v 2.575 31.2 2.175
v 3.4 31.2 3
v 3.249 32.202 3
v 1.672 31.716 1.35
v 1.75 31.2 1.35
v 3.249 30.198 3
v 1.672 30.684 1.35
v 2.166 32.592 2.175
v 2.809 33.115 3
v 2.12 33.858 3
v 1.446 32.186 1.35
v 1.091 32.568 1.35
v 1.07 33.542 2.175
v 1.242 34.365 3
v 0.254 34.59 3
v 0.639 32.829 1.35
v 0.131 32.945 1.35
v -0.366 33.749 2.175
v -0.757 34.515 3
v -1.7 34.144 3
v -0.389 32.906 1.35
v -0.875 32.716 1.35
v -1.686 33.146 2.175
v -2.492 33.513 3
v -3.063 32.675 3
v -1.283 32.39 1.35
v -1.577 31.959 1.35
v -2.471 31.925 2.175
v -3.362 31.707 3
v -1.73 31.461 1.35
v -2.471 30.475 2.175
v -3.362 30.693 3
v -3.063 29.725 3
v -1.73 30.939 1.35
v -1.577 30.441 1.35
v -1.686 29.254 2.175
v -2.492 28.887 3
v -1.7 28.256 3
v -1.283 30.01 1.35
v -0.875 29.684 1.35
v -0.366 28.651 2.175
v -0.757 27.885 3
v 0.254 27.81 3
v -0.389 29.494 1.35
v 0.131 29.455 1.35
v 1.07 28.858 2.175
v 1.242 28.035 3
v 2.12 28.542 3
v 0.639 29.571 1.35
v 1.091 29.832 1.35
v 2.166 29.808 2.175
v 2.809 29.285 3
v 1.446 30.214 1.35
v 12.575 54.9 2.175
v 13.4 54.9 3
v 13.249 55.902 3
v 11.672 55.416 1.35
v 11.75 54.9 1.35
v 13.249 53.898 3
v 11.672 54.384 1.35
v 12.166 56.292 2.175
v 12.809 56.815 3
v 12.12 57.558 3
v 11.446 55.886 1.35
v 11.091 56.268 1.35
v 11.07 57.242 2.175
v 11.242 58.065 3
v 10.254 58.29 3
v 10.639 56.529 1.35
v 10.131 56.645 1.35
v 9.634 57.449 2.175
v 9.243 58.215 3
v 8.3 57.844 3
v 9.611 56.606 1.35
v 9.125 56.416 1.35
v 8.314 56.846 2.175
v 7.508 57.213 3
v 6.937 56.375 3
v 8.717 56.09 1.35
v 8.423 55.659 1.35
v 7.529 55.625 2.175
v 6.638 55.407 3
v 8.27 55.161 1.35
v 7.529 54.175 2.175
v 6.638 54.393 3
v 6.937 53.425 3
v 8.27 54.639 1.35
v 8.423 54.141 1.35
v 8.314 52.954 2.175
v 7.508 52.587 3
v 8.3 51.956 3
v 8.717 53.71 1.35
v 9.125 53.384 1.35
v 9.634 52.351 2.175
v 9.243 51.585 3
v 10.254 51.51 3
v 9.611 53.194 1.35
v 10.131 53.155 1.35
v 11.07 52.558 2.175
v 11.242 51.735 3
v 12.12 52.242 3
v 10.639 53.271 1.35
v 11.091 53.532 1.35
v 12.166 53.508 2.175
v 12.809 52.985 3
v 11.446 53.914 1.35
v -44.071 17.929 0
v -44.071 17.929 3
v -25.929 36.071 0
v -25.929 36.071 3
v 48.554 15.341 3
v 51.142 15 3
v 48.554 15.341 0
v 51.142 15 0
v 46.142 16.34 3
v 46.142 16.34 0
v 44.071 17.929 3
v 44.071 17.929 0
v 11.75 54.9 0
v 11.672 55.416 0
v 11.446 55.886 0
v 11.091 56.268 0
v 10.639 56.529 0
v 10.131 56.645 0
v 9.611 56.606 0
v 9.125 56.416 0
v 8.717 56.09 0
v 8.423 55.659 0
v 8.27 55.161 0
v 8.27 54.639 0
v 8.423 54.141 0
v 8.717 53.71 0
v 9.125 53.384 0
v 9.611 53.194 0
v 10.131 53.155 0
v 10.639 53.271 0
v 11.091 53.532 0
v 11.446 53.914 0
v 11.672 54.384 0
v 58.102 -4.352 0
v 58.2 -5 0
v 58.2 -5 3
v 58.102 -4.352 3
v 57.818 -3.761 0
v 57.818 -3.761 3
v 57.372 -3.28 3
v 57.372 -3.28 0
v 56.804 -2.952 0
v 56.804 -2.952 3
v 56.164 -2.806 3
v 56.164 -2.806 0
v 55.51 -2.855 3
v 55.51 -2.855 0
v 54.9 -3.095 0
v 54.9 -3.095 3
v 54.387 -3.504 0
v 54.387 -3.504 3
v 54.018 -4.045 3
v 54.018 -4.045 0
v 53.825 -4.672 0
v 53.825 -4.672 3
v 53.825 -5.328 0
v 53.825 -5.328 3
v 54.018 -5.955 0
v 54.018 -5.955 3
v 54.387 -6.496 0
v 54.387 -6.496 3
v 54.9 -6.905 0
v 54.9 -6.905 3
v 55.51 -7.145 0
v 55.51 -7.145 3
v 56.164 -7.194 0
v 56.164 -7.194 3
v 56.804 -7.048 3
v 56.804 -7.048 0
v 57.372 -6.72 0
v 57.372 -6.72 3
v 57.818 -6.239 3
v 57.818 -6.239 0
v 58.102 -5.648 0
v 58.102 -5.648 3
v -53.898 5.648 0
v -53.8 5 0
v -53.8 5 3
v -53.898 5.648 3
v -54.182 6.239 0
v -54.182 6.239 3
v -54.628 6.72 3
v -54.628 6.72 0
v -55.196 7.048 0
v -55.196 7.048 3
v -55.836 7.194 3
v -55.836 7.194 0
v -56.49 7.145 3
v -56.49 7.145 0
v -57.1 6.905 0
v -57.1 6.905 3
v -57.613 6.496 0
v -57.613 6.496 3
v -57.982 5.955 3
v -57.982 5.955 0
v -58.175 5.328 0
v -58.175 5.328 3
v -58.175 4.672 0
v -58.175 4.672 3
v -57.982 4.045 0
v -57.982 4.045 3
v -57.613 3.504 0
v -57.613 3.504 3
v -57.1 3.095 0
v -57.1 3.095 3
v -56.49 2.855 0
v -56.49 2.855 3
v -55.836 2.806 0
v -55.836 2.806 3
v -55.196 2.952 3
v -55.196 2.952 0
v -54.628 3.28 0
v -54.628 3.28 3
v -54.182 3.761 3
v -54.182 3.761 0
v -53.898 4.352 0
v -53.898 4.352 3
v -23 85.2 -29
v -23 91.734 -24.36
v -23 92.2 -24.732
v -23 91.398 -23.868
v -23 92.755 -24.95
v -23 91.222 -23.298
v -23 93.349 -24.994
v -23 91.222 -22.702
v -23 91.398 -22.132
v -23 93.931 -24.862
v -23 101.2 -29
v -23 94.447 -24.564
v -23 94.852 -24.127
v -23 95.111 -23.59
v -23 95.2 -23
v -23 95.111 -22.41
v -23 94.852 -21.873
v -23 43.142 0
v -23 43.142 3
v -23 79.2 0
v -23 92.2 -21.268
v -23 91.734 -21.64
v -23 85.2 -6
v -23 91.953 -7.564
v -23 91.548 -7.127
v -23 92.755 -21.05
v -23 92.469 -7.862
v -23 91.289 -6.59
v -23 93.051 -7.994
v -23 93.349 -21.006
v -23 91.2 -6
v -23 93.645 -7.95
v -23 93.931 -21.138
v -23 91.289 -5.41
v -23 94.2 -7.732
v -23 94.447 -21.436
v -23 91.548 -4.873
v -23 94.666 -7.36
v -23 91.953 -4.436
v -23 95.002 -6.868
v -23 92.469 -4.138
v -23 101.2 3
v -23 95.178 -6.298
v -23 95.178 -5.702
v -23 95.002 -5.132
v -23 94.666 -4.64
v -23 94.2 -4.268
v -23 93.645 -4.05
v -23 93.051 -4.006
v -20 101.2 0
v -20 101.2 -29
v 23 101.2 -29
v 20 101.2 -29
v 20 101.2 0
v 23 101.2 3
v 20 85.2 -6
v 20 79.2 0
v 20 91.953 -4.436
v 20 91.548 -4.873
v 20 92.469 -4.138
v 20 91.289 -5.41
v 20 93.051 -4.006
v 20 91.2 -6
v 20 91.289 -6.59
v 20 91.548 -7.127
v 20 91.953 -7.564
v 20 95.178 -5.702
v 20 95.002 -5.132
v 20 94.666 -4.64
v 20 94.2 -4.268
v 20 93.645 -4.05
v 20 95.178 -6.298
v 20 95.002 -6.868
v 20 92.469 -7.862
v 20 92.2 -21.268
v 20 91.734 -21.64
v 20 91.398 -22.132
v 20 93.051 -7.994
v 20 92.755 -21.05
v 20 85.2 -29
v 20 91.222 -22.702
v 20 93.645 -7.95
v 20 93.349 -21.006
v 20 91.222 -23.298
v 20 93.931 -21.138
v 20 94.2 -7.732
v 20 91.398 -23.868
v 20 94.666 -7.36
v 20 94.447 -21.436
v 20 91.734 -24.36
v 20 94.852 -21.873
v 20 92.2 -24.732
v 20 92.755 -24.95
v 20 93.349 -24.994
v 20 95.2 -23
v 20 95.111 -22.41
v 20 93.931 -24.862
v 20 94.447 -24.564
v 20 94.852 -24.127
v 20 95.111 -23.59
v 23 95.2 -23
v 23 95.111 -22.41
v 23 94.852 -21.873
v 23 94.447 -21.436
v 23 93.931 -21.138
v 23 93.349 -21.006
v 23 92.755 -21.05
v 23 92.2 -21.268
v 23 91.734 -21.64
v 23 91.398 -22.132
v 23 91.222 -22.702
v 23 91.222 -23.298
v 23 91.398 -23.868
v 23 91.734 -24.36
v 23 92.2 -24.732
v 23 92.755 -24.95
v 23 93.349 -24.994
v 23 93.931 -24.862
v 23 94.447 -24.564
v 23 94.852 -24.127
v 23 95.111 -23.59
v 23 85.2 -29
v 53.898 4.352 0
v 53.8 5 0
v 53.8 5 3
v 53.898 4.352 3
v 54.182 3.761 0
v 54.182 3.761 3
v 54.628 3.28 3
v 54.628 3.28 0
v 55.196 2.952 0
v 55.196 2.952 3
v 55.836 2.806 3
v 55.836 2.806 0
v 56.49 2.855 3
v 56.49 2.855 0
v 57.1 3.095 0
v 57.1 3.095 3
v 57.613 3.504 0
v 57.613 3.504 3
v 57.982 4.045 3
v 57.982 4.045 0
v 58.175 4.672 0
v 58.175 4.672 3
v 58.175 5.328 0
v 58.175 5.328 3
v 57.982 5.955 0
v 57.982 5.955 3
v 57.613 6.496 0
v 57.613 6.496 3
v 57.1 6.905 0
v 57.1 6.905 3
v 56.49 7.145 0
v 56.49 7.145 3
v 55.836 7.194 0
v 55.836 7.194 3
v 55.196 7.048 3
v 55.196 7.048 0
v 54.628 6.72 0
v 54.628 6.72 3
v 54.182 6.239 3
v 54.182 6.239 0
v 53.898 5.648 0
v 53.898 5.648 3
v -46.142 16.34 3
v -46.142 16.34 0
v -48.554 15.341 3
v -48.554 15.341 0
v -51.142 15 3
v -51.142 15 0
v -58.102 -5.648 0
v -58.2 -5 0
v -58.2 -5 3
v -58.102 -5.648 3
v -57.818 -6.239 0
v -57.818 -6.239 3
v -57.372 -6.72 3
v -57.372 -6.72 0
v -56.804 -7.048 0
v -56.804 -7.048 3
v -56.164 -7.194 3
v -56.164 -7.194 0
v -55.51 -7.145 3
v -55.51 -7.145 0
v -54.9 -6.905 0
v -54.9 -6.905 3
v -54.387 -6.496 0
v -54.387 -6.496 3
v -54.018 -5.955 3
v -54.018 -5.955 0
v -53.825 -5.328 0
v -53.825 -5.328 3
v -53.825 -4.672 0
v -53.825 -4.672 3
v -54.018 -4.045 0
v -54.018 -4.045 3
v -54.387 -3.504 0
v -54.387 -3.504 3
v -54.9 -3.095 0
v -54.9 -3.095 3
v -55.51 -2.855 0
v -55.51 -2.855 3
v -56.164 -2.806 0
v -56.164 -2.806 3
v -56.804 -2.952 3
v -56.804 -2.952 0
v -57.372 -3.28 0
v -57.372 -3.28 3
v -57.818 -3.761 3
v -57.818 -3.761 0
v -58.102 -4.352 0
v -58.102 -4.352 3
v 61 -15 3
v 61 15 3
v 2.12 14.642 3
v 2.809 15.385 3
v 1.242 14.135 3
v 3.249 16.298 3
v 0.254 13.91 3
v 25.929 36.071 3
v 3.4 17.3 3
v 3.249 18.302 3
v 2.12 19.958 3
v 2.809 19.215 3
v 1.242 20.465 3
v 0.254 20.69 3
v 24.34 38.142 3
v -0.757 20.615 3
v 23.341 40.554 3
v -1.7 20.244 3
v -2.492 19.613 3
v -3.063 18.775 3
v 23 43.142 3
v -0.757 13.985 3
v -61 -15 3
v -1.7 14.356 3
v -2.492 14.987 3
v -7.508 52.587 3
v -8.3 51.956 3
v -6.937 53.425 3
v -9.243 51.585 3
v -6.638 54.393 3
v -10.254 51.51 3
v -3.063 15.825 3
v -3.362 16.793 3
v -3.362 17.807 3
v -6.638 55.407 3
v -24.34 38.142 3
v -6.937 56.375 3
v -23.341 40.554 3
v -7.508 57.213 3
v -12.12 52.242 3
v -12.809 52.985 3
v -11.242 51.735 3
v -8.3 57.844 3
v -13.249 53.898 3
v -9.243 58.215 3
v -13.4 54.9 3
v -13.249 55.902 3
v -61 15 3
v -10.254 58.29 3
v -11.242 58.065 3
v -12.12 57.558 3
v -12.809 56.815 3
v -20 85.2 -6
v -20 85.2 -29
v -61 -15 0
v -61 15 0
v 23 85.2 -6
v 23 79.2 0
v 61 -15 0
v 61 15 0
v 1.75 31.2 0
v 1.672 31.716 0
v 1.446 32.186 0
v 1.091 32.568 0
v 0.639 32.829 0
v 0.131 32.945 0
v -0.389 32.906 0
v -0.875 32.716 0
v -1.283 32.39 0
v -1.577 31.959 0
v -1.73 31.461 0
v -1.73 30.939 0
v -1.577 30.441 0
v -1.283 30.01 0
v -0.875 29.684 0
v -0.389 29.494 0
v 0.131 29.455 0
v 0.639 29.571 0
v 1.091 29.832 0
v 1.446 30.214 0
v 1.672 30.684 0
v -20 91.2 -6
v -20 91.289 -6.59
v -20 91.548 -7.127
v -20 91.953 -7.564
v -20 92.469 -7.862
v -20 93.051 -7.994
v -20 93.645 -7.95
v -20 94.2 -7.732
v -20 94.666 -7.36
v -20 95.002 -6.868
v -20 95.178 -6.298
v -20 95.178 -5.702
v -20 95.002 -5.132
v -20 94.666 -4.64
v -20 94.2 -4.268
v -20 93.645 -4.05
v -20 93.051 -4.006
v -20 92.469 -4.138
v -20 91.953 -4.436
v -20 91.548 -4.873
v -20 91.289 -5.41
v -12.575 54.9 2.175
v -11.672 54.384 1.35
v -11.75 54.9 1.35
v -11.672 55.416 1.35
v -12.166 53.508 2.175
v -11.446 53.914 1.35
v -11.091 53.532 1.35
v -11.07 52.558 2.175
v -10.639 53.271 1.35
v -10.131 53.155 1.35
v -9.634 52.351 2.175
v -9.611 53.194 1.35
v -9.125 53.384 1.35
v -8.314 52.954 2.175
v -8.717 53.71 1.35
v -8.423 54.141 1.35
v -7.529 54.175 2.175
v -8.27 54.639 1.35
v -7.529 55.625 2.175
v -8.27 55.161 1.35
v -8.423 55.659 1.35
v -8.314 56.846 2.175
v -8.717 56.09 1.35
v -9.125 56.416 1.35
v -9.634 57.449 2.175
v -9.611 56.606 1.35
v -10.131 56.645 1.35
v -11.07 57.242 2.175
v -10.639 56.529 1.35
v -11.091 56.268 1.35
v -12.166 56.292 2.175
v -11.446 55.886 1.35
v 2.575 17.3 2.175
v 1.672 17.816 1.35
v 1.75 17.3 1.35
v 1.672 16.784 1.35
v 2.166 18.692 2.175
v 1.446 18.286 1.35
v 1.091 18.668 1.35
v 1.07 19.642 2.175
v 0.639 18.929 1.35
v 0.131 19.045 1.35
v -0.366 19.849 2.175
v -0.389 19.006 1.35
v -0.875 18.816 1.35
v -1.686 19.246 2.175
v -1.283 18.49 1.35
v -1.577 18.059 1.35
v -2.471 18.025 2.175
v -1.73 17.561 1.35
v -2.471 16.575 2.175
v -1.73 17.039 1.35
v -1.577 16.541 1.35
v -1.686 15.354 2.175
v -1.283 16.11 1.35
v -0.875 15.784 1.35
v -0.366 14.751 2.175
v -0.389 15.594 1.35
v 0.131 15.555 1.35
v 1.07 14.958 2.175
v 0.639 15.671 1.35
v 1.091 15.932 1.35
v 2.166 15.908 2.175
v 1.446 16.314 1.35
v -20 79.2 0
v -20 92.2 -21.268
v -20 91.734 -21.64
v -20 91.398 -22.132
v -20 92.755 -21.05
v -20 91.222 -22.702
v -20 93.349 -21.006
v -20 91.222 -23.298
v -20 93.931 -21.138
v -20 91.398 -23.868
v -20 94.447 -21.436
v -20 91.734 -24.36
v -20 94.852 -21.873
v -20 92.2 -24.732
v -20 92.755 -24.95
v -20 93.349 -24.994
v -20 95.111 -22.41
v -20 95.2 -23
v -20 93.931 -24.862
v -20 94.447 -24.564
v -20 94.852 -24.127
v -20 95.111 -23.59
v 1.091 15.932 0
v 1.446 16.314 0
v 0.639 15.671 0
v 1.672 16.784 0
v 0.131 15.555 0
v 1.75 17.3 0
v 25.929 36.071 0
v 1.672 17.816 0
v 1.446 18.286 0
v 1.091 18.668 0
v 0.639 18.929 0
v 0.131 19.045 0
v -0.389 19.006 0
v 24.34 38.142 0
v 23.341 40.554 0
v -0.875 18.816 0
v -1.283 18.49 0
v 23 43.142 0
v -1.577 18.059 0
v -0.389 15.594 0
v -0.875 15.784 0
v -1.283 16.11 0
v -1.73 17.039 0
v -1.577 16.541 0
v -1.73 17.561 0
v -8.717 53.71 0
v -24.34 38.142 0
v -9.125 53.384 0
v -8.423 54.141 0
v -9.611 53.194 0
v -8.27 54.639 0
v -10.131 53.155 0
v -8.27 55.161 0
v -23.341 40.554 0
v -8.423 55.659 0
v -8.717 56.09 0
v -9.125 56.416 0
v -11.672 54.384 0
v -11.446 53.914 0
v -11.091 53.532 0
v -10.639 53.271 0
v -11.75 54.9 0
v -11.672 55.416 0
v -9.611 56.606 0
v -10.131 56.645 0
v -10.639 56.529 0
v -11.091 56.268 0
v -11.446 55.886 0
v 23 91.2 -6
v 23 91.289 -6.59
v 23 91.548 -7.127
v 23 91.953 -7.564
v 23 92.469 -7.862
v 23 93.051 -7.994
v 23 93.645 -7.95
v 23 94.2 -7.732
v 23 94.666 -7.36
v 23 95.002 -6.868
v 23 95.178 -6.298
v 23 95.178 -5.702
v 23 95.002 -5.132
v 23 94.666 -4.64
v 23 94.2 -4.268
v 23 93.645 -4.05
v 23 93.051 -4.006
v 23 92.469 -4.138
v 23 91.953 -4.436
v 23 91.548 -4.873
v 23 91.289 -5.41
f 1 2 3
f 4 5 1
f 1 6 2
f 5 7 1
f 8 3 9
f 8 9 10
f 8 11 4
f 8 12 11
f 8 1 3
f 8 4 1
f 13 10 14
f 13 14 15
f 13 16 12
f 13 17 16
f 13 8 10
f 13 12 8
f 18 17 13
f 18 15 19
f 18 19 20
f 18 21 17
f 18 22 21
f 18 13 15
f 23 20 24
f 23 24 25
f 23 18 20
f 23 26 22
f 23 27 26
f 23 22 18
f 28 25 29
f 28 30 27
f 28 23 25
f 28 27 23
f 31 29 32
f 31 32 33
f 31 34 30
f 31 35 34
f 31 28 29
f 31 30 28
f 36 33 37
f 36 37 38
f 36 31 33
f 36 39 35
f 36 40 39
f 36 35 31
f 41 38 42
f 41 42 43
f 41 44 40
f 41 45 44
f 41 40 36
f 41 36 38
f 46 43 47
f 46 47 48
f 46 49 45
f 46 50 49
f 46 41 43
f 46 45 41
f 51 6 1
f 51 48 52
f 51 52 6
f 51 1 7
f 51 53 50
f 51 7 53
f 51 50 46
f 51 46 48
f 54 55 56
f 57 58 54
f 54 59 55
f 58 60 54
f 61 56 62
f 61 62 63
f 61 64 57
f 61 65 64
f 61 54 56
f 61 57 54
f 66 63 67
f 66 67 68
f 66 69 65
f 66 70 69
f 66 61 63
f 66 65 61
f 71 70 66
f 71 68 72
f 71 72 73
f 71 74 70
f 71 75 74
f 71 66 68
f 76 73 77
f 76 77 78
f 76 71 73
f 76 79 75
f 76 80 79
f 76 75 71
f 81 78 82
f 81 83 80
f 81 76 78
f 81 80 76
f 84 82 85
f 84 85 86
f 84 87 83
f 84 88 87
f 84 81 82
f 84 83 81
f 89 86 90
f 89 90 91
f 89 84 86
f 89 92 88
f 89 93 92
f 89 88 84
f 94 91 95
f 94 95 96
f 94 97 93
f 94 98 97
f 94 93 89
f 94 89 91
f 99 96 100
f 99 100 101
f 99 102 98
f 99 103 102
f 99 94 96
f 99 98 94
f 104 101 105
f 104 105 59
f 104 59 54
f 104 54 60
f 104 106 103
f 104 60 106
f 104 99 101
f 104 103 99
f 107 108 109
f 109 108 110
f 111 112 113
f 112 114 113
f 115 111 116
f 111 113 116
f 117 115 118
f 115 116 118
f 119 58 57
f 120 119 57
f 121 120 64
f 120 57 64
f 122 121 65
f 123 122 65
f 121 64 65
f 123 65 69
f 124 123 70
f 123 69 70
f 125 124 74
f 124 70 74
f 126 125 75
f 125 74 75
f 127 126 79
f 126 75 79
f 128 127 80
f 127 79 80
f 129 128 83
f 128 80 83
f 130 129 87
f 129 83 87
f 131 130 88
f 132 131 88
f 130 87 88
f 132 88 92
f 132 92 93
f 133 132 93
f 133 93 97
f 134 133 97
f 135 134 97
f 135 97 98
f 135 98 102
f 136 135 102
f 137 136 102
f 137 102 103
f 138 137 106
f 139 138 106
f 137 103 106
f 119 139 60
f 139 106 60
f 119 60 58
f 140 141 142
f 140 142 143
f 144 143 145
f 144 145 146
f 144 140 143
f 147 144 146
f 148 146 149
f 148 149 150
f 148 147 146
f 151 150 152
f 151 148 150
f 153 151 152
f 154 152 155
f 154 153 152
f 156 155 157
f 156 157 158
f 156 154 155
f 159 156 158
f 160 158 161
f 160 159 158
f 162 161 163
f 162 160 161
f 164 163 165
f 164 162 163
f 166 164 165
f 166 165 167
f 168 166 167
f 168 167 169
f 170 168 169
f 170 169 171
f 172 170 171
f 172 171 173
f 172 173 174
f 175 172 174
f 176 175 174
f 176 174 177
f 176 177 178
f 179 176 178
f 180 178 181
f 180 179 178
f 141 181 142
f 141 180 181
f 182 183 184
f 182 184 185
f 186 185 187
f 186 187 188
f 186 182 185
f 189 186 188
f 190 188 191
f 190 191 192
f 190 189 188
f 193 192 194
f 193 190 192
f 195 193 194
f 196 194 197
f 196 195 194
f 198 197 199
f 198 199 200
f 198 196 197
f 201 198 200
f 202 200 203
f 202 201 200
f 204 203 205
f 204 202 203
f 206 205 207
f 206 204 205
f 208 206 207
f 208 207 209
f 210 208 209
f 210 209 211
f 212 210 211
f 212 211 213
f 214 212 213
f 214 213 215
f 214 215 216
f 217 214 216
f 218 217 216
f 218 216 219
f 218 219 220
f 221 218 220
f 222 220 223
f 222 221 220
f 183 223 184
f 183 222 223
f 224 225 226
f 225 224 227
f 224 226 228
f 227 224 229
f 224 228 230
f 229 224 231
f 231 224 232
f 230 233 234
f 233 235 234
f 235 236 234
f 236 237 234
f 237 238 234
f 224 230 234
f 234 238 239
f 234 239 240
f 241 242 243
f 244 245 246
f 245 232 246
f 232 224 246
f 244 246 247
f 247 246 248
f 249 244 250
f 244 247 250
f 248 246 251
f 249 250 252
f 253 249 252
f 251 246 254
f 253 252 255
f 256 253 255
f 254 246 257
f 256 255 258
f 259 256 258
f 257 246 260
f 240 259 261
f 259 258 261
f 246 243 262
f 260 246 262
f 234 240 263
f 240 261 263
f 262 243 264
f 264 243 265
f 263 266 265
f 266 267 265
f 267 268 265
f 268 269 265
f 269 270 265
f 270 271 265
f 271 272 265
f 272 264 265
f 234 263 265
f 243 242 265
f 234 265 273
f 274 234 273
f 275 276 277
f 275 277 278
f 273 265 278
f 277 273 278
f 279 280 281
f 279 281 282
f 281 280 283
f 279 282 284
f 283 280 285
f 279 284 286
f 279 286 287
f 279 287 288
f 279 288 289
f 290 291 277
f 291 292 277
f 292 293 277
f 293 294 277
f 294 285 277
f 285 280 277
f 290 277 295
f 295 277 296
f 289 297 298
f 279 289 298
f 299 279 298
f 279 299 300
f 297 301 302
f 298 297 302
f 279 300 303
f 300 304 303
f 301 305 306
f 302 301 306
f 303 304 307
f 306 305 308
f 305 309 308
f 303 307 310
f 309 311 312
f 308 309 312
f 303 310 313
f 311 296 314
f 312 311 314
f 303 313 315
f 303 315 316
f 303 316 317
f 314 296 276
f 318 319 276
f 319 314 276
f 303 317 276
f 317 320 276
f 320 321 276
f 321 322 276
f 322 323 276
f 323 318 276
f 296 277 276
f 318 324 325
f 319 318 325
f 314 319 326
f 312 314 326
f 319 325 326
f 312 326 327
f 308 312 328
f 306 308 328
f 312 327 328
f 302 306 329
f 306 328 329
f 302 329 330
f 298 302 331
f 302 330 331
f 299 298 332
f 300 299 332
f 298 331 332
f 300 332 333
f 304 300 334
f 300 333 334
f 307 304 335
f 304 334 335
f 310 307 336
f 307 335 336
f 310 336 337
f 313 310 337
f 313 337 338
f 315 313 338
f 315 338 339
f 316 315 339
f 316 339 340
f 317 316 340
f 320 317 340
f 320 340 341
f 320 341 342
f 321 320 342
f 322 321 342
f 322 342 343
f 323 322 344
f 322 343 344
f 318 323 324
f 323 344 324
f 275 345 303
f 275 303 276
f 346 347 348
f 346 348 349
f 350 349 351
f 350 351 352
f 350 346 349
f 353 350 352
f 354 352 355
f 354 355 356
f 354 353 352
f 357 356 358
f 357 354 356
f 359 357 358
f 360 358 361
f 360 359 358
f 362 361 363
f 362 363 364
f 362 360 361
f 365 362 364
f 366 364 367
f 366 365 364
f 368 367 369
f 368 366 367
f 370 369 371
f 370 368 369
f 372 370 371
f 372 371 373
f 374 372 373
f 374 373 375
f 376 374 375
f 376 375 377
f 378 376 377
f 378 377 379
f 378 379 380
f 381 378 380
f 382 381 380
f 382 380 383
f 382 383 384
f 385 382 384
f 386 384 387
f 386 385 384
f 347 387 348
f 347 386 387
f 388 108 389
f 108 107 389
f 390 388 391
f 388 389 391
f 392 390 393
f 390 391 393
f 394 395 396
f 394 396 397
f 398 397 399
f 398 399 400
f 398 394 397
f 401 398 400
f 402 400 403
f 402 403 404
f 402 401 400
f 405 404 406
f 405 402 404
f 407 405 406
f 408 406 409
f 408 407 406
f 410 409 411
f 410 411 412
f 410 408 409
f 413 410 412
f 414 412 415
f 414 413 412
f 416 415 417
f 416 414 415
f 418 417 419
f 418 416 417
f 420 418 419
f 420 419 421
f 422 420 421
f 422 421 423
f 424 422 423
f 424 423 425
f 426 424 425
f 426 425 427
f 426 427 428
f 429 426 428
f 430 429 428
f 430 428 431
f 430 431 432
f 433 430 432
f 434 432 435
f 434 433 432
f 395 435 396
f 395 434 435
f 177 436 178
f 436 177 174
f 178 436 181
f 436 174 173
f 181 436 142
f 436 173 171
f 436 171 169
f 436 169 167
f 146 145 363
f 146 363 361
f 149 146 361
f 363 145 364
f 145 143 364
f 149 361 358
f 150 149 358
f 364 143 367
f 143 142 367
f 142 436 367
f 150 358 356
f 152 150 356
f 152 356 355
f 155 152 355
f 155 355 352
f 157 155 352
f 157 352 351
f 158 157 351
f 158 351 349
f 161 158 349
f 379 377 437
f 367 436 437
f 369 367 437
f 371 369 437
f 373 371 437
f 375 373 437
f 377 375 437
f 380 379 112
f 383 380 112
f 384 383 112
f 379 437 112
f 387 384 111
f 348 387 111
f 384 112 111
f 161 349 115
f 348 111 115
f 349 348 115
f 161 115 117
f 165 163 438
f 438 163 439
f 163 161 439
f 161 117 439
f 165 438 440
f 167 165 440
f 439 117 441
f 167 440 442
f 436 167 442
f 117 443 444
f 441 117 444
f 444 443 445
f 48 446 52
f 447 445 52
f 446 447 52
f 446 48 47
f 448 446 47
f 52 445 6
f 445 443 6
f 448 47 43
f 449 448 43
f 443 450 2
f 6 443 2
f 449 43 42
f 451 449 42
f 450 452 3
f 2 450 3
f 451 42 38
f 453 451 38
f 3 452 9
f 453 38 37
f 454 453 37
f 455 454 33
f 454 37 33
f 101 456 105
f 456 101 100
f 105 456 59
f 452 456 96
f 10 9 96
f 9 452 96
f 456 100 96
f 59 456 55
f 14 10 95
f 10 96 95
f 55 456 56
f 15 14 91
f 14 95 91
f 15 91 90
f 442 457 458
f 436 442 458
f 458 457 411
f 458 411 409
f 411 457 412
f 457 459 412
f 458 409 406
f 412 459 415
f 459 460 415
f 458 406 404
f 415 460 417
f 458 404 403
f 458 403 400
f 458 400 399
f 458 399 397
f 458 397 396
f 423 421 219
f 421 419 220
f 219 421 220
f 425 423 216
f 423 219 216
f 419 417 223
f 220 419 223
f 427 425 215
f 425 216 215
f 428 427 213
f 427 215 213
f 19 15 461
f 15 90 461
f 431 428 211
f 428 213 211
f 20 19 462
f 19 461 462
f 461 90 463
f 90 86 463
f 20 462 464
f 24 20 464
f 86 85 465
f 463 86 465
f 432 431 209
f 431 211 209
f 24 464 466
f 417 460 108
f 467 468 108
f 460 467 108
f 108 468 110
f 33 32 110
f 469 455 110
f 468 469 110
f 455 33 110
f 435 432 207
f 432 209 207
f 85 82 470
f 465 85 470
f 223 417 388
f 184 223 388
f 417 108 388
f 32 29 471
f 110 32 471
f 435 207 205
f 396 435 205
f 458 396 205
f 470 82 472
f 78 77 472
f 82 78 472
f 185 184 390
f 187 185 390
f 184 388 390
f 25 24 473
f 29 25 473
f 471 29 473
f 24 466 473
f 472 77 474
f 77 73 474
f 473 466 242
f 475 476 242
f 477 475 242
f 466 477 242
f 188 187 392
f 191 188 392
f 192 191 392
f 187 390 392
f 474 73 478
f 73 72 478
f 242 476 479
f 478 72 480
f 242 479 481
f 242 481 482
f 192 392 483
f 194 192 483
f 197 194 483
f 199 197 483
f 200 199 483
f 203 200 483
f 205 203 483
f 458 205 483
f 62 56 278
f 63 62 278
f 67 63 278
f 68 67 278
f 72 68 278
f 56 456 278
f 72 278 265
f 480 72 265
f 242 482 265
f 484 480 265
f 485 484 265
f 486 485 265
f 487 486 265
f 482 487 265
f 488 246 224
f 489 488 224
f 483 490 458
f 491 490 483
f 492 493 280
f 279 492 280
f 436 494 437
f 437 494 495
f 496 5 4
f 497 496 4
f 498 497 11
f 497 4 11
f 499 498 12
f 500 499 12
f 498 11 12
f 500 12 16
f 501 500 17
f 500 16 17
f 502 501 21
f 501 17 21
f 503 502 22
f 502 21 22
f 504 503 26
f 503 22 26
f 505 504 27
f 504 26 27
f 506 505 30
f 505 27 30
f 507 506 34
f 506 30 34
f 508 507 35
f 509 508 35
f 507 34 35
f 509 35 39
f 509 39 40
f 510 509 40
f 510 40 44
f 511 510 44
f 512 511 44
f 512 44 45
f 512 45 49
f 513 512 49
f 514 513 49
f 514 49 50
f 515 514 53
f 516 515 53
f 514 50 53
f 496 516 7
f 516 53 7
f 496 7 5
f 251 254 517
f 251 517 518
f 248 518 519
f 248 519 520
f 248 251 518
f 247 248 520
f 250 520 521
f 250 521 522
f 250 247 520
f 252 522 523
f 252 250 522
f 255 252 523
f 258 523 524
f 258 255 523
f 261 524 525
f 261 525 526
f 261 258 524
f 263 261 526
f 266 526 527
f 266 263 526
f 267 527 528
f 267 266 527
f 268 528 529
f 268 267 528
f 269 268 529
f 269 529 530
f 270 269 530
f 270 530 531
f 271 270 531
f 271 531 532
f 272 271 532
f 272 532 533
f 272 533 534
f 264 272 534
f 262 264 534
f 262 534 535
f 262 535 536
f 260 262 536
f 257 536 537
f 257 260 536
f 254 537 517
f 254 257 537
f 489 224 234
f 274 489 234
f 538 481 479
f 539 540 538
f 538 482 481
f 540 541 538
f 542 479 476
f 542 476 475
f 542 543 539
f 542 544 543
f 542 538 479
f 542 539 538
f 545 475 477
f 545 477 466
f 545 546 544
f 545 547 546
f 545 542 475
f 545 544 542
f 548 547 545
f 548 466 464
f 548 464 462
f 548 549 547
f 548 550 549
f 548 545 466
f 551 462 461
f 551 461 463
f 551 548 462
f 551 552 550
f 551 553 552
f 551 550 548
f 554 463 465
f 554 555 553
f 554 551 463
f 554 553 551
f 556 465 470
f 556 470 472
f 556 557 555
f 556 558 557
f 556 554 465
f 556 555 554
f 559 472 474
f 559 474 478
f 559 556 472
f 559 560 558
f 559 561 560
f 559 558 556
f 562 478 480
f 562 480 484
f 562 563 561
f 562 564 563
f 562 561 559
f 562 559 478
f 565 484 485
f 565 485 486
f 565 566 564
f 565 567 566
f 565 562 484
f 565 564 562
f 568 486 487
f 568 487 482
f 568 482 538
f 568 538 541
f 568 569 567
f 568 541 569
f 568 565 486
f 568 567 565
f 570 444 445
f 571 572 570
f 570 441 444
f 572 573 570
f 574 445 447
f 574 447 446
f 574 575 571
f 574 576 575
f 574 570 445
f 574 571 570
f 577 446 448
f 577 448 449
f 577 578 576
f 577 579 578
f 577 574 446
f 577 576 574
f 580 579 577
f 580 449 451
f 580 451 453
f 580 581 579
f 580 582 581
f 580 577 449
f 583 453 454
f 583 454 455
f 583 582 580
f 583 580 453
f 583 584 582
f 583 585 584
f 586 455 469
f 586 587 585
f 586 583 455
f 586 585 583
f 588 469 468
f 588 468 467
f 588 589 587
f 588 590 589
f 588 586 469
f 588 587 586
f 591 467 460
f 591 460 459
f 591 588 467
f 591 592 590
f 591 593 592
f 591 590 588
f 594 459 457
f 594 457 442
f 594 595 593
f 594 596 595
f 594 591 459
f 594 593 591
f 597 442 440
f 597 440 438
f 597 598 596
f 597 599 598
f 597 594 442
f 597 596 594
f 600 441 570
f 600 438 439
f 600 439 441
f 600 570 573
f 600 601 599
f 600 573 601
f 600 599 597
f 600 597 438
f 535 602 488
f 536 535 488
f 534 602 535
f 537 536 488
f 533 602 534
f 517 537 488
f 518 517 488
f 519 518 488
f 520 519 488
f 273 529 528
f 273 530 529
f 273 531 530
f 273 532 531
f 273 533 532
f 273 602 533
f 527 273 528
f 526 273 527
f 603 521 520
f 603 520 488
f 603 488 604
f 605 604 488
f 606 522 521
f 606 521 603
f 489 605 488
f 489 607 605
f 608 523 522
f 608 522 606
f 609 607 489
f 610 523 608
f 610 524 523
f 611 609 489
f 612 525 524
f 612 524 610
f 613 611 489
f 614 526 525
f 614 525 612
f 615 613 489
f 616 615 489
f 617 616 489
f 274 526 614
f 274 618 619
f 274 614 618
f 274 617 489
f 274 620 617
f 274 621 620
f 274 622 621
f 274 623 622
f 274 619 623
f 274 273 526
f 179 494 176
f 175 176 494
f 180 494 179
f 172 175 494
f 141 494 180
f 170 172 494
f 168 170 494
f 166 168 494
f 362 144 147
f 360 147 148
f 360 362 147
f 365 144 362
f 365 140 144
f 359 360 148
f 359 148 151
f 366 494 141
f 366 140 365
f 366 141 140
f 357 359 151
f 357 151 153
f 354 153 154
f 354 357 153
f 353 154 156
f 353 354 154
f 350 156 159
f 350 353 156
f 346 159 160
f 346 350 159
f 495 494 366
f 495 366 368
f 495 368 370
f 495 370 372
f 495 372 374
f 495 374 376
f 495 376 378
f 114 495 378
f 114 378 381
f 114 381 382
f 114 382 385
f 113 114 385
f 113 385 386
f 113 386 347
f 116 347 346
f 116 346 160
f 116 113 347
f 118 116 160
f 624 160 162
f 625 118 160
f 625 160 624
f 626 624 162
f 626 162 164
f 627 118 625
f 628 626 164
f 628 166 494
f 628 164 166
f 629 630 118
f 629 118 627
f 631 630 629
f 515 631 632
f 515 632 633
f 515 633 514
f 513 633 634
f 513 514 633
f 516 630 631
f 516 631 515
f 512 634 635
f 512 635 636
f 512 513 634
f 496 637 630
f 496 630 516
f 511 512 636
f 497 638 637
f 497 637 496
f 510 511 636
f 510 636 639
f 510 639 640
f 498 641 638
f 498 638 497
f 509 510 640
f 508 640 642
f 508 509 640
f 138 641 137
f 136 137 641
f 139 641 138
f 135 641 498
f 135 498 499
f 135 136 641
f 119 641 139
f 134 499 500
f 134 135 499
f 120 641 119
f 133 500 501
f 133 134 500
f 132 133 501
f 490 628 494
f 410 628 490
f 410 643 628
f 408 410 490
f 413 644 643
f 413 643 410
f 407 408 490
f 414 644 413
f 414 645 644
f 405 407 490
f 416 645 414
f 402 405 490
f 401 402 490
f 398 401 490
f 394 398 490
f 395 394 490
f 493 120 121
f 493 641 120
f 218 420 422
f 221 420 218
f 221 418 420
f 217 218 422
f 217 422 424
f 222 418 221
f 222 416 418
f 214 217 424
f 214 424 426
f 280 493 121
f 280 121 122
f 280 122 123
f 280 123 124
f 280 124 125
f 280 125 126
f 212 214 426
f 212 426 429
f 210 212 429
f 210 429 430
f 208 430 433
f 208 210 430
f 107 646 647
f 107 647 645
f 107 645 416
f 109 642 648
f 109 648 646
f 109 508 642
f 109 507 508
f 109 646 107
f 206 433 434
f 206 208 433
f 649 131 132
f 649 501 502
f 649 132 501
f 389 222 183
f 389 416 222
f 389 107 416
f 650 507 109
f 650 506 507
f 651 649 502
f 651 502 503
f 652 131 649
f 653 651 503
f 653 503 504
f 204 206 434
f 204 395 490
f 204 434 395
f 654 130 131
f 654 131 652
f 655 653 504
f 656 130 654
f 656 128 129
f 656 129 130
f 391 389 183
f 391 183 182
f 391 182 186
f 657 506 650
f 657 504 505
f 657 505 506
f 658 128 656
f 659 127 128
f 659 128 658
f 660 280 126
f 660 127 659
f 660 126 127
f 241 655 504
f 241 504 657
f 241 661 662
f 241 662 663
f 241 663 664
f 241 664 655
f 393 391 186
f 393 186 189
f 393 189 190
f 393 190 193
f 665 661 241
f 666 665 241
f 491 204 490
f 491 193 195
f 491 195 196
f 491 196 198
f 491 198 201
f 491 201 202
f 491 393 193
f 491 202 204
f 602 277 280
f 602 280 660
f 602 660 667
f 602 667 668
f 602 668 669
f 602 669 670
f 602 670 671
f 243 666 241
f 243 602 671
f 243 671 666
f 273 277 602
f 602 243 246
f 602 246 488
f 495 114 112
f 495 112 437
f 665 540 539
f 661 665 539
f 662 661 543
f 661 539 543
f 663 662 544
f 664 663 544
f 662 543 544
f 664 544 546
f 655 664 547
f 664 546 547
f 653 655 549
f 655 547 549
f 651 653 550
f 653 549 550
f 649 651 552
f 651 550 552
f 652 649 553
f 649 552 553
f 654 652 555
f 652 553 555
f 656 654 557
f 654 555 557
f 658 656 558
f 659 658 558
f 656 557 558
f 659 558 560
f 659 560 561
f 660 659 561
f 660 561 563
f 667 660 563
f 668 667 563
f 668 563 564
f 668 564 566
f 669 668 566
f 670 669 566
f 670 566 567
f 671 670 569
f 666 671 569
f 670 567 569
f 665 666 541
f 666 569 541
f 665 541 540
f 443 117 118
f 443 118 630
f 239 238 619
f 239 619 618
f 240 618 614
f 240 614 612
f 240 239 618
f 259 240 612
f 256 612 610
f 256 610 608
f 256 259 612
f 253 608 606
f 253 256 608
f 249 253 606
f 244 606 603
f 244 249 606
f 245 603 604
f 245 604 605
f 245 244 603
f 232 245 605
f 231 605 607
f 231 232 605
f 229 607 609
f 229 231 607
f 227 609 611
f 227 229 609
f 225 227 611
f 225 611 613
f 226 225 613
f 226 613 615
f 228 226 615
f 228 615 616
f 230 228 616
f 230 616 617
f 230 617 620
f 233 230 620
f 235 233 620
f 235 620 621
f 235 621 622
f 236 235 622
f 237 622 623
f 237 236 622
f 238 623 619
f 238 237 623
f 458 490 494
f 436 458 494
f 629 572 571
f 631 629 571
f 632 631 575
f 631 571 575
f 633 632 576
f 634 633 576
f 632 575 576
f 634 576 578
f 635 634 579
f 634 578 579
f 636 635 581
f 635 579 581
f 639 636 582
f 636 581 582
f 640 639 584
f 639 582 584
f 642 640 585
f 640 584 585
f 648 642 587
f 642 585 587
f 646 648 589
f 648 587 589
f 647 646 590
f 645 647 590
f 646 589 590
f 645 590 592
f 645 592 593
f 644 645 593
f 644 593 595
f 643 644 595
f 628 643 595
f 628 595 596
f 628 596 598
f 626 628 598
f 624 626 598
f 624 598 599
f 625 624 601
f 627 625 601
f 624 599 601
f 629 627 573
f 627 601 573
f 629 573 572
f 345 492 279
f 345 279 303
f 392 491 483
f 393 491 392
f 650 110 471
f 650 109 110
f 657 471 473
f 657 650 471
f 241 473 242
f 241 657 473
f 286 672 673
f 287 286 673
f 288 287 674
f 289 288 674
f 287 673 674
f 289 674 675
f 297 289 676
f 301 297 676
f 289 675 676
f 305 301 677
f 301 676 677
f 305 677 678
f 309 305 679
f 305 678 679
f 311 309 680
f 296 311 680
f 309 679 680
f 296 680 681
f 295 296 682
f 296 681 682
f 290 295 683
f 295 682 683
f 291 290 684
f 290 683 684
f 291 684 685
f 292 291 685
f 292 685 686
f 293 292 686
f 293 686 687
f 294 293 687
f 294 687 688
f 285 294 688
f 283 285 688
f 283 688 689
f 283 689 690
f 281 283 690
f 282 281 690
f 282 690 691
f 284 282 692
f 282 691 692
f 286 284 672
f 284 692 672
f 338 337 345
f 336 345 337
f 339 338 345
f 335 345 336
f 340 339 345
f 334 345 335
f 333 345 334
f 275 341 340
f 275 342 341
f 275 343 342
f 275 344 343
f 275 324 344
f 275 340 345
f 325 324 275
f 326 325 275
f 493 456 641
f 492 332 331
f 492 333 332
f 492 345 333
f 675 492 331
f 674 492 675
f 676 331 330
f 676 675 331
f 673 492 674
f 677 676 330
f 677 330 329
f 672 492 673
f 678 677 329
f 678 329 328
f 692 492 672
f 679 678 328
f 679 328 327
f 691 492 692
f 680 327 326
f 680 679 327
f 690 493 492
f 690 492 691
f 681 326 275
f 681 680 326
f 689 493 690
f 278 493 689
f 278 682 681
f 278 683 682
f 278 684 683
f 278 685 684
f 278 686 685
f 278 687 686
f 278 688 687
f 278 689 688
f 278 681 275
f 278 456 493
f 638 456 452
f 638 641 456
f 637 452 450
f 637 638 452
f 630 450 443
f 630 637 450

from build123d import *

# Parameters (mm, degrees)
SKETCH1_W           = 122
SKETCH1_H           = 30
SKETCH1_R           = 2.2
BOSS_EXTRUDE1_DEPTH = 3
SKETCH2_W           = 46
SKETCH2_H           = 86.2
SKETCH2_R           = 1.75
BOSS_EXTRUDE2_DEPTH = 3
BOSS_EXTRUDE3_DEPTH = 3
FILLET1_R           = 10
CHAMFER1_SIZE       = 1.65
SKETCH4_W           = 32
SKETCH4_H           = 16
SKETCH4_R           = 2
BOSS_EXTRUDE4_DEPTH = 3
CHAMFER2_SIZE       = 6


with BuildPart() as part:
    # Sketch1 → Boss-Extrude1 (new body)
    with BuildSketch(Plane.XY):
        Rectangle(SKETCH1_W, SKETCH1_H)
        with Locations((-56, 5)):
            Circle(SKETCH1_R, mode=Mode.SUBTRACT)
        with Locations(Location((-56, -5, 0), (0, 0, 180))):
            Circle(SKETCH1_R, mode=Mode.SUBTRACT)
        with Locations((56, -5)):
            Circle(SKETCH1_R, mode=Mode.SUBTRACT)
        with Locations(Location((56, 5, 0), (0, 0, 180))):
            Circle(SKETCH1_R, mode=Mode.SUBTRACT)
    extrude(amount=BOSS_EXTRUDE1_DEPTH)

    # Sketch2 → Boss-Extrude2 (add)
    with BuildSketch(Plane.XY.offset(3)):
        with Locations((0, 58.1)):
            Rectangle(SKETCH2_W, SKETCH2_H)
        with Locations((0, 17.3)):
            Circle(SKETCH2_R, mode=Mode.SUBTRACT)
        with Locations((10, 54.9)):
            Circle(SKETCH2_R, mode=Mode.SUBTRACT)
        with Locations((0, 31.2)):
            Circle(SKETCH2_R, mode=Mode.SUBTRACT)
        with Locations(Location((-10, 54.9, 0), (0, 0, 180))):
            Circle(SKETCH2_R, mode=Mode.SUBTRACT)
    extrude(amount=-BOSS_EXTRUDE2_DEPTH)

    # Sketch3 → Boss-Extrude3 (add)
    with BuildSketch(Plane.XY.offset(3)):
        Polygon((-47, 15), (-23, 39), (-23, 15), align=None)
        Polygon((23, 39), (23, 15), (47, 15), align=None)
    extrude(amount=-BOSS_EXTRUDE3_DEPTH)

    # Fillet1
    fillet1_edges = [part.edges().sort_by_distance(p)[0] for p in [
        (-47, 15, 1.5),
        (-23, 39, 1.5),
        (23, 39, 1.5),
        (47, 15, 1.5),
    ]]
    fillet(fillet1_edges, radius=FILLET1_R)

    # Chamfer1
    chamfer1_edges = [part.edges().sort_by_distance(p)[0] for p in [
        (-1.75, 17.3, 3),
        (8.25, 54.9, 3),
        (-1.75, 31.2, 3),
        (-8.25, 54.9, 3),
    ]]
    chamfer(chamfer1_edges, length=CHAMFER1_SIZE)

    # Sketch4 → Boss-Extrude4 (add)
    with BuildSketch(Plane(origin=(23, 0, 0), x_dir=(0, 0, -1), z_dir=(1, 0, 0))):
        with Locations((13, 93.2)):
            Rectangle(SKETCH4_W, SKETCH4_H)
        with Locations(Location((23, 93.2, 0), (0, 0, 90))):
            Circle(SKETCH4_R, mode=Mode.SUBTRACT)
        with Locations(Location((6, 93.2, 0), (0, 0, 270))):
            Circle(SKETCH4_R, mode=Mode.SUBTRACT)
    boss_extrude4 = extrude(amount=-BOSS_EXTRUDE4_DEPTH)

    # Mirror1: Boss-Extrude4 across plane
    add(boss_extrude4.mirror(Plane(origin=(0, 0, 0), x_dir=(0, 0, 1), z_dir=(1, 0, 0))))

    # Chamfer2
    chamfer2_edges = [part.edges().sort_by_distance(p)[0] for p in [
        (21.5, 85.2, 0),
        (-21.5, 85.2, 0),
    ]]
    chamfer(chamfer2_edges, length=CHAMFER2_SIZE)


solid = part.part
